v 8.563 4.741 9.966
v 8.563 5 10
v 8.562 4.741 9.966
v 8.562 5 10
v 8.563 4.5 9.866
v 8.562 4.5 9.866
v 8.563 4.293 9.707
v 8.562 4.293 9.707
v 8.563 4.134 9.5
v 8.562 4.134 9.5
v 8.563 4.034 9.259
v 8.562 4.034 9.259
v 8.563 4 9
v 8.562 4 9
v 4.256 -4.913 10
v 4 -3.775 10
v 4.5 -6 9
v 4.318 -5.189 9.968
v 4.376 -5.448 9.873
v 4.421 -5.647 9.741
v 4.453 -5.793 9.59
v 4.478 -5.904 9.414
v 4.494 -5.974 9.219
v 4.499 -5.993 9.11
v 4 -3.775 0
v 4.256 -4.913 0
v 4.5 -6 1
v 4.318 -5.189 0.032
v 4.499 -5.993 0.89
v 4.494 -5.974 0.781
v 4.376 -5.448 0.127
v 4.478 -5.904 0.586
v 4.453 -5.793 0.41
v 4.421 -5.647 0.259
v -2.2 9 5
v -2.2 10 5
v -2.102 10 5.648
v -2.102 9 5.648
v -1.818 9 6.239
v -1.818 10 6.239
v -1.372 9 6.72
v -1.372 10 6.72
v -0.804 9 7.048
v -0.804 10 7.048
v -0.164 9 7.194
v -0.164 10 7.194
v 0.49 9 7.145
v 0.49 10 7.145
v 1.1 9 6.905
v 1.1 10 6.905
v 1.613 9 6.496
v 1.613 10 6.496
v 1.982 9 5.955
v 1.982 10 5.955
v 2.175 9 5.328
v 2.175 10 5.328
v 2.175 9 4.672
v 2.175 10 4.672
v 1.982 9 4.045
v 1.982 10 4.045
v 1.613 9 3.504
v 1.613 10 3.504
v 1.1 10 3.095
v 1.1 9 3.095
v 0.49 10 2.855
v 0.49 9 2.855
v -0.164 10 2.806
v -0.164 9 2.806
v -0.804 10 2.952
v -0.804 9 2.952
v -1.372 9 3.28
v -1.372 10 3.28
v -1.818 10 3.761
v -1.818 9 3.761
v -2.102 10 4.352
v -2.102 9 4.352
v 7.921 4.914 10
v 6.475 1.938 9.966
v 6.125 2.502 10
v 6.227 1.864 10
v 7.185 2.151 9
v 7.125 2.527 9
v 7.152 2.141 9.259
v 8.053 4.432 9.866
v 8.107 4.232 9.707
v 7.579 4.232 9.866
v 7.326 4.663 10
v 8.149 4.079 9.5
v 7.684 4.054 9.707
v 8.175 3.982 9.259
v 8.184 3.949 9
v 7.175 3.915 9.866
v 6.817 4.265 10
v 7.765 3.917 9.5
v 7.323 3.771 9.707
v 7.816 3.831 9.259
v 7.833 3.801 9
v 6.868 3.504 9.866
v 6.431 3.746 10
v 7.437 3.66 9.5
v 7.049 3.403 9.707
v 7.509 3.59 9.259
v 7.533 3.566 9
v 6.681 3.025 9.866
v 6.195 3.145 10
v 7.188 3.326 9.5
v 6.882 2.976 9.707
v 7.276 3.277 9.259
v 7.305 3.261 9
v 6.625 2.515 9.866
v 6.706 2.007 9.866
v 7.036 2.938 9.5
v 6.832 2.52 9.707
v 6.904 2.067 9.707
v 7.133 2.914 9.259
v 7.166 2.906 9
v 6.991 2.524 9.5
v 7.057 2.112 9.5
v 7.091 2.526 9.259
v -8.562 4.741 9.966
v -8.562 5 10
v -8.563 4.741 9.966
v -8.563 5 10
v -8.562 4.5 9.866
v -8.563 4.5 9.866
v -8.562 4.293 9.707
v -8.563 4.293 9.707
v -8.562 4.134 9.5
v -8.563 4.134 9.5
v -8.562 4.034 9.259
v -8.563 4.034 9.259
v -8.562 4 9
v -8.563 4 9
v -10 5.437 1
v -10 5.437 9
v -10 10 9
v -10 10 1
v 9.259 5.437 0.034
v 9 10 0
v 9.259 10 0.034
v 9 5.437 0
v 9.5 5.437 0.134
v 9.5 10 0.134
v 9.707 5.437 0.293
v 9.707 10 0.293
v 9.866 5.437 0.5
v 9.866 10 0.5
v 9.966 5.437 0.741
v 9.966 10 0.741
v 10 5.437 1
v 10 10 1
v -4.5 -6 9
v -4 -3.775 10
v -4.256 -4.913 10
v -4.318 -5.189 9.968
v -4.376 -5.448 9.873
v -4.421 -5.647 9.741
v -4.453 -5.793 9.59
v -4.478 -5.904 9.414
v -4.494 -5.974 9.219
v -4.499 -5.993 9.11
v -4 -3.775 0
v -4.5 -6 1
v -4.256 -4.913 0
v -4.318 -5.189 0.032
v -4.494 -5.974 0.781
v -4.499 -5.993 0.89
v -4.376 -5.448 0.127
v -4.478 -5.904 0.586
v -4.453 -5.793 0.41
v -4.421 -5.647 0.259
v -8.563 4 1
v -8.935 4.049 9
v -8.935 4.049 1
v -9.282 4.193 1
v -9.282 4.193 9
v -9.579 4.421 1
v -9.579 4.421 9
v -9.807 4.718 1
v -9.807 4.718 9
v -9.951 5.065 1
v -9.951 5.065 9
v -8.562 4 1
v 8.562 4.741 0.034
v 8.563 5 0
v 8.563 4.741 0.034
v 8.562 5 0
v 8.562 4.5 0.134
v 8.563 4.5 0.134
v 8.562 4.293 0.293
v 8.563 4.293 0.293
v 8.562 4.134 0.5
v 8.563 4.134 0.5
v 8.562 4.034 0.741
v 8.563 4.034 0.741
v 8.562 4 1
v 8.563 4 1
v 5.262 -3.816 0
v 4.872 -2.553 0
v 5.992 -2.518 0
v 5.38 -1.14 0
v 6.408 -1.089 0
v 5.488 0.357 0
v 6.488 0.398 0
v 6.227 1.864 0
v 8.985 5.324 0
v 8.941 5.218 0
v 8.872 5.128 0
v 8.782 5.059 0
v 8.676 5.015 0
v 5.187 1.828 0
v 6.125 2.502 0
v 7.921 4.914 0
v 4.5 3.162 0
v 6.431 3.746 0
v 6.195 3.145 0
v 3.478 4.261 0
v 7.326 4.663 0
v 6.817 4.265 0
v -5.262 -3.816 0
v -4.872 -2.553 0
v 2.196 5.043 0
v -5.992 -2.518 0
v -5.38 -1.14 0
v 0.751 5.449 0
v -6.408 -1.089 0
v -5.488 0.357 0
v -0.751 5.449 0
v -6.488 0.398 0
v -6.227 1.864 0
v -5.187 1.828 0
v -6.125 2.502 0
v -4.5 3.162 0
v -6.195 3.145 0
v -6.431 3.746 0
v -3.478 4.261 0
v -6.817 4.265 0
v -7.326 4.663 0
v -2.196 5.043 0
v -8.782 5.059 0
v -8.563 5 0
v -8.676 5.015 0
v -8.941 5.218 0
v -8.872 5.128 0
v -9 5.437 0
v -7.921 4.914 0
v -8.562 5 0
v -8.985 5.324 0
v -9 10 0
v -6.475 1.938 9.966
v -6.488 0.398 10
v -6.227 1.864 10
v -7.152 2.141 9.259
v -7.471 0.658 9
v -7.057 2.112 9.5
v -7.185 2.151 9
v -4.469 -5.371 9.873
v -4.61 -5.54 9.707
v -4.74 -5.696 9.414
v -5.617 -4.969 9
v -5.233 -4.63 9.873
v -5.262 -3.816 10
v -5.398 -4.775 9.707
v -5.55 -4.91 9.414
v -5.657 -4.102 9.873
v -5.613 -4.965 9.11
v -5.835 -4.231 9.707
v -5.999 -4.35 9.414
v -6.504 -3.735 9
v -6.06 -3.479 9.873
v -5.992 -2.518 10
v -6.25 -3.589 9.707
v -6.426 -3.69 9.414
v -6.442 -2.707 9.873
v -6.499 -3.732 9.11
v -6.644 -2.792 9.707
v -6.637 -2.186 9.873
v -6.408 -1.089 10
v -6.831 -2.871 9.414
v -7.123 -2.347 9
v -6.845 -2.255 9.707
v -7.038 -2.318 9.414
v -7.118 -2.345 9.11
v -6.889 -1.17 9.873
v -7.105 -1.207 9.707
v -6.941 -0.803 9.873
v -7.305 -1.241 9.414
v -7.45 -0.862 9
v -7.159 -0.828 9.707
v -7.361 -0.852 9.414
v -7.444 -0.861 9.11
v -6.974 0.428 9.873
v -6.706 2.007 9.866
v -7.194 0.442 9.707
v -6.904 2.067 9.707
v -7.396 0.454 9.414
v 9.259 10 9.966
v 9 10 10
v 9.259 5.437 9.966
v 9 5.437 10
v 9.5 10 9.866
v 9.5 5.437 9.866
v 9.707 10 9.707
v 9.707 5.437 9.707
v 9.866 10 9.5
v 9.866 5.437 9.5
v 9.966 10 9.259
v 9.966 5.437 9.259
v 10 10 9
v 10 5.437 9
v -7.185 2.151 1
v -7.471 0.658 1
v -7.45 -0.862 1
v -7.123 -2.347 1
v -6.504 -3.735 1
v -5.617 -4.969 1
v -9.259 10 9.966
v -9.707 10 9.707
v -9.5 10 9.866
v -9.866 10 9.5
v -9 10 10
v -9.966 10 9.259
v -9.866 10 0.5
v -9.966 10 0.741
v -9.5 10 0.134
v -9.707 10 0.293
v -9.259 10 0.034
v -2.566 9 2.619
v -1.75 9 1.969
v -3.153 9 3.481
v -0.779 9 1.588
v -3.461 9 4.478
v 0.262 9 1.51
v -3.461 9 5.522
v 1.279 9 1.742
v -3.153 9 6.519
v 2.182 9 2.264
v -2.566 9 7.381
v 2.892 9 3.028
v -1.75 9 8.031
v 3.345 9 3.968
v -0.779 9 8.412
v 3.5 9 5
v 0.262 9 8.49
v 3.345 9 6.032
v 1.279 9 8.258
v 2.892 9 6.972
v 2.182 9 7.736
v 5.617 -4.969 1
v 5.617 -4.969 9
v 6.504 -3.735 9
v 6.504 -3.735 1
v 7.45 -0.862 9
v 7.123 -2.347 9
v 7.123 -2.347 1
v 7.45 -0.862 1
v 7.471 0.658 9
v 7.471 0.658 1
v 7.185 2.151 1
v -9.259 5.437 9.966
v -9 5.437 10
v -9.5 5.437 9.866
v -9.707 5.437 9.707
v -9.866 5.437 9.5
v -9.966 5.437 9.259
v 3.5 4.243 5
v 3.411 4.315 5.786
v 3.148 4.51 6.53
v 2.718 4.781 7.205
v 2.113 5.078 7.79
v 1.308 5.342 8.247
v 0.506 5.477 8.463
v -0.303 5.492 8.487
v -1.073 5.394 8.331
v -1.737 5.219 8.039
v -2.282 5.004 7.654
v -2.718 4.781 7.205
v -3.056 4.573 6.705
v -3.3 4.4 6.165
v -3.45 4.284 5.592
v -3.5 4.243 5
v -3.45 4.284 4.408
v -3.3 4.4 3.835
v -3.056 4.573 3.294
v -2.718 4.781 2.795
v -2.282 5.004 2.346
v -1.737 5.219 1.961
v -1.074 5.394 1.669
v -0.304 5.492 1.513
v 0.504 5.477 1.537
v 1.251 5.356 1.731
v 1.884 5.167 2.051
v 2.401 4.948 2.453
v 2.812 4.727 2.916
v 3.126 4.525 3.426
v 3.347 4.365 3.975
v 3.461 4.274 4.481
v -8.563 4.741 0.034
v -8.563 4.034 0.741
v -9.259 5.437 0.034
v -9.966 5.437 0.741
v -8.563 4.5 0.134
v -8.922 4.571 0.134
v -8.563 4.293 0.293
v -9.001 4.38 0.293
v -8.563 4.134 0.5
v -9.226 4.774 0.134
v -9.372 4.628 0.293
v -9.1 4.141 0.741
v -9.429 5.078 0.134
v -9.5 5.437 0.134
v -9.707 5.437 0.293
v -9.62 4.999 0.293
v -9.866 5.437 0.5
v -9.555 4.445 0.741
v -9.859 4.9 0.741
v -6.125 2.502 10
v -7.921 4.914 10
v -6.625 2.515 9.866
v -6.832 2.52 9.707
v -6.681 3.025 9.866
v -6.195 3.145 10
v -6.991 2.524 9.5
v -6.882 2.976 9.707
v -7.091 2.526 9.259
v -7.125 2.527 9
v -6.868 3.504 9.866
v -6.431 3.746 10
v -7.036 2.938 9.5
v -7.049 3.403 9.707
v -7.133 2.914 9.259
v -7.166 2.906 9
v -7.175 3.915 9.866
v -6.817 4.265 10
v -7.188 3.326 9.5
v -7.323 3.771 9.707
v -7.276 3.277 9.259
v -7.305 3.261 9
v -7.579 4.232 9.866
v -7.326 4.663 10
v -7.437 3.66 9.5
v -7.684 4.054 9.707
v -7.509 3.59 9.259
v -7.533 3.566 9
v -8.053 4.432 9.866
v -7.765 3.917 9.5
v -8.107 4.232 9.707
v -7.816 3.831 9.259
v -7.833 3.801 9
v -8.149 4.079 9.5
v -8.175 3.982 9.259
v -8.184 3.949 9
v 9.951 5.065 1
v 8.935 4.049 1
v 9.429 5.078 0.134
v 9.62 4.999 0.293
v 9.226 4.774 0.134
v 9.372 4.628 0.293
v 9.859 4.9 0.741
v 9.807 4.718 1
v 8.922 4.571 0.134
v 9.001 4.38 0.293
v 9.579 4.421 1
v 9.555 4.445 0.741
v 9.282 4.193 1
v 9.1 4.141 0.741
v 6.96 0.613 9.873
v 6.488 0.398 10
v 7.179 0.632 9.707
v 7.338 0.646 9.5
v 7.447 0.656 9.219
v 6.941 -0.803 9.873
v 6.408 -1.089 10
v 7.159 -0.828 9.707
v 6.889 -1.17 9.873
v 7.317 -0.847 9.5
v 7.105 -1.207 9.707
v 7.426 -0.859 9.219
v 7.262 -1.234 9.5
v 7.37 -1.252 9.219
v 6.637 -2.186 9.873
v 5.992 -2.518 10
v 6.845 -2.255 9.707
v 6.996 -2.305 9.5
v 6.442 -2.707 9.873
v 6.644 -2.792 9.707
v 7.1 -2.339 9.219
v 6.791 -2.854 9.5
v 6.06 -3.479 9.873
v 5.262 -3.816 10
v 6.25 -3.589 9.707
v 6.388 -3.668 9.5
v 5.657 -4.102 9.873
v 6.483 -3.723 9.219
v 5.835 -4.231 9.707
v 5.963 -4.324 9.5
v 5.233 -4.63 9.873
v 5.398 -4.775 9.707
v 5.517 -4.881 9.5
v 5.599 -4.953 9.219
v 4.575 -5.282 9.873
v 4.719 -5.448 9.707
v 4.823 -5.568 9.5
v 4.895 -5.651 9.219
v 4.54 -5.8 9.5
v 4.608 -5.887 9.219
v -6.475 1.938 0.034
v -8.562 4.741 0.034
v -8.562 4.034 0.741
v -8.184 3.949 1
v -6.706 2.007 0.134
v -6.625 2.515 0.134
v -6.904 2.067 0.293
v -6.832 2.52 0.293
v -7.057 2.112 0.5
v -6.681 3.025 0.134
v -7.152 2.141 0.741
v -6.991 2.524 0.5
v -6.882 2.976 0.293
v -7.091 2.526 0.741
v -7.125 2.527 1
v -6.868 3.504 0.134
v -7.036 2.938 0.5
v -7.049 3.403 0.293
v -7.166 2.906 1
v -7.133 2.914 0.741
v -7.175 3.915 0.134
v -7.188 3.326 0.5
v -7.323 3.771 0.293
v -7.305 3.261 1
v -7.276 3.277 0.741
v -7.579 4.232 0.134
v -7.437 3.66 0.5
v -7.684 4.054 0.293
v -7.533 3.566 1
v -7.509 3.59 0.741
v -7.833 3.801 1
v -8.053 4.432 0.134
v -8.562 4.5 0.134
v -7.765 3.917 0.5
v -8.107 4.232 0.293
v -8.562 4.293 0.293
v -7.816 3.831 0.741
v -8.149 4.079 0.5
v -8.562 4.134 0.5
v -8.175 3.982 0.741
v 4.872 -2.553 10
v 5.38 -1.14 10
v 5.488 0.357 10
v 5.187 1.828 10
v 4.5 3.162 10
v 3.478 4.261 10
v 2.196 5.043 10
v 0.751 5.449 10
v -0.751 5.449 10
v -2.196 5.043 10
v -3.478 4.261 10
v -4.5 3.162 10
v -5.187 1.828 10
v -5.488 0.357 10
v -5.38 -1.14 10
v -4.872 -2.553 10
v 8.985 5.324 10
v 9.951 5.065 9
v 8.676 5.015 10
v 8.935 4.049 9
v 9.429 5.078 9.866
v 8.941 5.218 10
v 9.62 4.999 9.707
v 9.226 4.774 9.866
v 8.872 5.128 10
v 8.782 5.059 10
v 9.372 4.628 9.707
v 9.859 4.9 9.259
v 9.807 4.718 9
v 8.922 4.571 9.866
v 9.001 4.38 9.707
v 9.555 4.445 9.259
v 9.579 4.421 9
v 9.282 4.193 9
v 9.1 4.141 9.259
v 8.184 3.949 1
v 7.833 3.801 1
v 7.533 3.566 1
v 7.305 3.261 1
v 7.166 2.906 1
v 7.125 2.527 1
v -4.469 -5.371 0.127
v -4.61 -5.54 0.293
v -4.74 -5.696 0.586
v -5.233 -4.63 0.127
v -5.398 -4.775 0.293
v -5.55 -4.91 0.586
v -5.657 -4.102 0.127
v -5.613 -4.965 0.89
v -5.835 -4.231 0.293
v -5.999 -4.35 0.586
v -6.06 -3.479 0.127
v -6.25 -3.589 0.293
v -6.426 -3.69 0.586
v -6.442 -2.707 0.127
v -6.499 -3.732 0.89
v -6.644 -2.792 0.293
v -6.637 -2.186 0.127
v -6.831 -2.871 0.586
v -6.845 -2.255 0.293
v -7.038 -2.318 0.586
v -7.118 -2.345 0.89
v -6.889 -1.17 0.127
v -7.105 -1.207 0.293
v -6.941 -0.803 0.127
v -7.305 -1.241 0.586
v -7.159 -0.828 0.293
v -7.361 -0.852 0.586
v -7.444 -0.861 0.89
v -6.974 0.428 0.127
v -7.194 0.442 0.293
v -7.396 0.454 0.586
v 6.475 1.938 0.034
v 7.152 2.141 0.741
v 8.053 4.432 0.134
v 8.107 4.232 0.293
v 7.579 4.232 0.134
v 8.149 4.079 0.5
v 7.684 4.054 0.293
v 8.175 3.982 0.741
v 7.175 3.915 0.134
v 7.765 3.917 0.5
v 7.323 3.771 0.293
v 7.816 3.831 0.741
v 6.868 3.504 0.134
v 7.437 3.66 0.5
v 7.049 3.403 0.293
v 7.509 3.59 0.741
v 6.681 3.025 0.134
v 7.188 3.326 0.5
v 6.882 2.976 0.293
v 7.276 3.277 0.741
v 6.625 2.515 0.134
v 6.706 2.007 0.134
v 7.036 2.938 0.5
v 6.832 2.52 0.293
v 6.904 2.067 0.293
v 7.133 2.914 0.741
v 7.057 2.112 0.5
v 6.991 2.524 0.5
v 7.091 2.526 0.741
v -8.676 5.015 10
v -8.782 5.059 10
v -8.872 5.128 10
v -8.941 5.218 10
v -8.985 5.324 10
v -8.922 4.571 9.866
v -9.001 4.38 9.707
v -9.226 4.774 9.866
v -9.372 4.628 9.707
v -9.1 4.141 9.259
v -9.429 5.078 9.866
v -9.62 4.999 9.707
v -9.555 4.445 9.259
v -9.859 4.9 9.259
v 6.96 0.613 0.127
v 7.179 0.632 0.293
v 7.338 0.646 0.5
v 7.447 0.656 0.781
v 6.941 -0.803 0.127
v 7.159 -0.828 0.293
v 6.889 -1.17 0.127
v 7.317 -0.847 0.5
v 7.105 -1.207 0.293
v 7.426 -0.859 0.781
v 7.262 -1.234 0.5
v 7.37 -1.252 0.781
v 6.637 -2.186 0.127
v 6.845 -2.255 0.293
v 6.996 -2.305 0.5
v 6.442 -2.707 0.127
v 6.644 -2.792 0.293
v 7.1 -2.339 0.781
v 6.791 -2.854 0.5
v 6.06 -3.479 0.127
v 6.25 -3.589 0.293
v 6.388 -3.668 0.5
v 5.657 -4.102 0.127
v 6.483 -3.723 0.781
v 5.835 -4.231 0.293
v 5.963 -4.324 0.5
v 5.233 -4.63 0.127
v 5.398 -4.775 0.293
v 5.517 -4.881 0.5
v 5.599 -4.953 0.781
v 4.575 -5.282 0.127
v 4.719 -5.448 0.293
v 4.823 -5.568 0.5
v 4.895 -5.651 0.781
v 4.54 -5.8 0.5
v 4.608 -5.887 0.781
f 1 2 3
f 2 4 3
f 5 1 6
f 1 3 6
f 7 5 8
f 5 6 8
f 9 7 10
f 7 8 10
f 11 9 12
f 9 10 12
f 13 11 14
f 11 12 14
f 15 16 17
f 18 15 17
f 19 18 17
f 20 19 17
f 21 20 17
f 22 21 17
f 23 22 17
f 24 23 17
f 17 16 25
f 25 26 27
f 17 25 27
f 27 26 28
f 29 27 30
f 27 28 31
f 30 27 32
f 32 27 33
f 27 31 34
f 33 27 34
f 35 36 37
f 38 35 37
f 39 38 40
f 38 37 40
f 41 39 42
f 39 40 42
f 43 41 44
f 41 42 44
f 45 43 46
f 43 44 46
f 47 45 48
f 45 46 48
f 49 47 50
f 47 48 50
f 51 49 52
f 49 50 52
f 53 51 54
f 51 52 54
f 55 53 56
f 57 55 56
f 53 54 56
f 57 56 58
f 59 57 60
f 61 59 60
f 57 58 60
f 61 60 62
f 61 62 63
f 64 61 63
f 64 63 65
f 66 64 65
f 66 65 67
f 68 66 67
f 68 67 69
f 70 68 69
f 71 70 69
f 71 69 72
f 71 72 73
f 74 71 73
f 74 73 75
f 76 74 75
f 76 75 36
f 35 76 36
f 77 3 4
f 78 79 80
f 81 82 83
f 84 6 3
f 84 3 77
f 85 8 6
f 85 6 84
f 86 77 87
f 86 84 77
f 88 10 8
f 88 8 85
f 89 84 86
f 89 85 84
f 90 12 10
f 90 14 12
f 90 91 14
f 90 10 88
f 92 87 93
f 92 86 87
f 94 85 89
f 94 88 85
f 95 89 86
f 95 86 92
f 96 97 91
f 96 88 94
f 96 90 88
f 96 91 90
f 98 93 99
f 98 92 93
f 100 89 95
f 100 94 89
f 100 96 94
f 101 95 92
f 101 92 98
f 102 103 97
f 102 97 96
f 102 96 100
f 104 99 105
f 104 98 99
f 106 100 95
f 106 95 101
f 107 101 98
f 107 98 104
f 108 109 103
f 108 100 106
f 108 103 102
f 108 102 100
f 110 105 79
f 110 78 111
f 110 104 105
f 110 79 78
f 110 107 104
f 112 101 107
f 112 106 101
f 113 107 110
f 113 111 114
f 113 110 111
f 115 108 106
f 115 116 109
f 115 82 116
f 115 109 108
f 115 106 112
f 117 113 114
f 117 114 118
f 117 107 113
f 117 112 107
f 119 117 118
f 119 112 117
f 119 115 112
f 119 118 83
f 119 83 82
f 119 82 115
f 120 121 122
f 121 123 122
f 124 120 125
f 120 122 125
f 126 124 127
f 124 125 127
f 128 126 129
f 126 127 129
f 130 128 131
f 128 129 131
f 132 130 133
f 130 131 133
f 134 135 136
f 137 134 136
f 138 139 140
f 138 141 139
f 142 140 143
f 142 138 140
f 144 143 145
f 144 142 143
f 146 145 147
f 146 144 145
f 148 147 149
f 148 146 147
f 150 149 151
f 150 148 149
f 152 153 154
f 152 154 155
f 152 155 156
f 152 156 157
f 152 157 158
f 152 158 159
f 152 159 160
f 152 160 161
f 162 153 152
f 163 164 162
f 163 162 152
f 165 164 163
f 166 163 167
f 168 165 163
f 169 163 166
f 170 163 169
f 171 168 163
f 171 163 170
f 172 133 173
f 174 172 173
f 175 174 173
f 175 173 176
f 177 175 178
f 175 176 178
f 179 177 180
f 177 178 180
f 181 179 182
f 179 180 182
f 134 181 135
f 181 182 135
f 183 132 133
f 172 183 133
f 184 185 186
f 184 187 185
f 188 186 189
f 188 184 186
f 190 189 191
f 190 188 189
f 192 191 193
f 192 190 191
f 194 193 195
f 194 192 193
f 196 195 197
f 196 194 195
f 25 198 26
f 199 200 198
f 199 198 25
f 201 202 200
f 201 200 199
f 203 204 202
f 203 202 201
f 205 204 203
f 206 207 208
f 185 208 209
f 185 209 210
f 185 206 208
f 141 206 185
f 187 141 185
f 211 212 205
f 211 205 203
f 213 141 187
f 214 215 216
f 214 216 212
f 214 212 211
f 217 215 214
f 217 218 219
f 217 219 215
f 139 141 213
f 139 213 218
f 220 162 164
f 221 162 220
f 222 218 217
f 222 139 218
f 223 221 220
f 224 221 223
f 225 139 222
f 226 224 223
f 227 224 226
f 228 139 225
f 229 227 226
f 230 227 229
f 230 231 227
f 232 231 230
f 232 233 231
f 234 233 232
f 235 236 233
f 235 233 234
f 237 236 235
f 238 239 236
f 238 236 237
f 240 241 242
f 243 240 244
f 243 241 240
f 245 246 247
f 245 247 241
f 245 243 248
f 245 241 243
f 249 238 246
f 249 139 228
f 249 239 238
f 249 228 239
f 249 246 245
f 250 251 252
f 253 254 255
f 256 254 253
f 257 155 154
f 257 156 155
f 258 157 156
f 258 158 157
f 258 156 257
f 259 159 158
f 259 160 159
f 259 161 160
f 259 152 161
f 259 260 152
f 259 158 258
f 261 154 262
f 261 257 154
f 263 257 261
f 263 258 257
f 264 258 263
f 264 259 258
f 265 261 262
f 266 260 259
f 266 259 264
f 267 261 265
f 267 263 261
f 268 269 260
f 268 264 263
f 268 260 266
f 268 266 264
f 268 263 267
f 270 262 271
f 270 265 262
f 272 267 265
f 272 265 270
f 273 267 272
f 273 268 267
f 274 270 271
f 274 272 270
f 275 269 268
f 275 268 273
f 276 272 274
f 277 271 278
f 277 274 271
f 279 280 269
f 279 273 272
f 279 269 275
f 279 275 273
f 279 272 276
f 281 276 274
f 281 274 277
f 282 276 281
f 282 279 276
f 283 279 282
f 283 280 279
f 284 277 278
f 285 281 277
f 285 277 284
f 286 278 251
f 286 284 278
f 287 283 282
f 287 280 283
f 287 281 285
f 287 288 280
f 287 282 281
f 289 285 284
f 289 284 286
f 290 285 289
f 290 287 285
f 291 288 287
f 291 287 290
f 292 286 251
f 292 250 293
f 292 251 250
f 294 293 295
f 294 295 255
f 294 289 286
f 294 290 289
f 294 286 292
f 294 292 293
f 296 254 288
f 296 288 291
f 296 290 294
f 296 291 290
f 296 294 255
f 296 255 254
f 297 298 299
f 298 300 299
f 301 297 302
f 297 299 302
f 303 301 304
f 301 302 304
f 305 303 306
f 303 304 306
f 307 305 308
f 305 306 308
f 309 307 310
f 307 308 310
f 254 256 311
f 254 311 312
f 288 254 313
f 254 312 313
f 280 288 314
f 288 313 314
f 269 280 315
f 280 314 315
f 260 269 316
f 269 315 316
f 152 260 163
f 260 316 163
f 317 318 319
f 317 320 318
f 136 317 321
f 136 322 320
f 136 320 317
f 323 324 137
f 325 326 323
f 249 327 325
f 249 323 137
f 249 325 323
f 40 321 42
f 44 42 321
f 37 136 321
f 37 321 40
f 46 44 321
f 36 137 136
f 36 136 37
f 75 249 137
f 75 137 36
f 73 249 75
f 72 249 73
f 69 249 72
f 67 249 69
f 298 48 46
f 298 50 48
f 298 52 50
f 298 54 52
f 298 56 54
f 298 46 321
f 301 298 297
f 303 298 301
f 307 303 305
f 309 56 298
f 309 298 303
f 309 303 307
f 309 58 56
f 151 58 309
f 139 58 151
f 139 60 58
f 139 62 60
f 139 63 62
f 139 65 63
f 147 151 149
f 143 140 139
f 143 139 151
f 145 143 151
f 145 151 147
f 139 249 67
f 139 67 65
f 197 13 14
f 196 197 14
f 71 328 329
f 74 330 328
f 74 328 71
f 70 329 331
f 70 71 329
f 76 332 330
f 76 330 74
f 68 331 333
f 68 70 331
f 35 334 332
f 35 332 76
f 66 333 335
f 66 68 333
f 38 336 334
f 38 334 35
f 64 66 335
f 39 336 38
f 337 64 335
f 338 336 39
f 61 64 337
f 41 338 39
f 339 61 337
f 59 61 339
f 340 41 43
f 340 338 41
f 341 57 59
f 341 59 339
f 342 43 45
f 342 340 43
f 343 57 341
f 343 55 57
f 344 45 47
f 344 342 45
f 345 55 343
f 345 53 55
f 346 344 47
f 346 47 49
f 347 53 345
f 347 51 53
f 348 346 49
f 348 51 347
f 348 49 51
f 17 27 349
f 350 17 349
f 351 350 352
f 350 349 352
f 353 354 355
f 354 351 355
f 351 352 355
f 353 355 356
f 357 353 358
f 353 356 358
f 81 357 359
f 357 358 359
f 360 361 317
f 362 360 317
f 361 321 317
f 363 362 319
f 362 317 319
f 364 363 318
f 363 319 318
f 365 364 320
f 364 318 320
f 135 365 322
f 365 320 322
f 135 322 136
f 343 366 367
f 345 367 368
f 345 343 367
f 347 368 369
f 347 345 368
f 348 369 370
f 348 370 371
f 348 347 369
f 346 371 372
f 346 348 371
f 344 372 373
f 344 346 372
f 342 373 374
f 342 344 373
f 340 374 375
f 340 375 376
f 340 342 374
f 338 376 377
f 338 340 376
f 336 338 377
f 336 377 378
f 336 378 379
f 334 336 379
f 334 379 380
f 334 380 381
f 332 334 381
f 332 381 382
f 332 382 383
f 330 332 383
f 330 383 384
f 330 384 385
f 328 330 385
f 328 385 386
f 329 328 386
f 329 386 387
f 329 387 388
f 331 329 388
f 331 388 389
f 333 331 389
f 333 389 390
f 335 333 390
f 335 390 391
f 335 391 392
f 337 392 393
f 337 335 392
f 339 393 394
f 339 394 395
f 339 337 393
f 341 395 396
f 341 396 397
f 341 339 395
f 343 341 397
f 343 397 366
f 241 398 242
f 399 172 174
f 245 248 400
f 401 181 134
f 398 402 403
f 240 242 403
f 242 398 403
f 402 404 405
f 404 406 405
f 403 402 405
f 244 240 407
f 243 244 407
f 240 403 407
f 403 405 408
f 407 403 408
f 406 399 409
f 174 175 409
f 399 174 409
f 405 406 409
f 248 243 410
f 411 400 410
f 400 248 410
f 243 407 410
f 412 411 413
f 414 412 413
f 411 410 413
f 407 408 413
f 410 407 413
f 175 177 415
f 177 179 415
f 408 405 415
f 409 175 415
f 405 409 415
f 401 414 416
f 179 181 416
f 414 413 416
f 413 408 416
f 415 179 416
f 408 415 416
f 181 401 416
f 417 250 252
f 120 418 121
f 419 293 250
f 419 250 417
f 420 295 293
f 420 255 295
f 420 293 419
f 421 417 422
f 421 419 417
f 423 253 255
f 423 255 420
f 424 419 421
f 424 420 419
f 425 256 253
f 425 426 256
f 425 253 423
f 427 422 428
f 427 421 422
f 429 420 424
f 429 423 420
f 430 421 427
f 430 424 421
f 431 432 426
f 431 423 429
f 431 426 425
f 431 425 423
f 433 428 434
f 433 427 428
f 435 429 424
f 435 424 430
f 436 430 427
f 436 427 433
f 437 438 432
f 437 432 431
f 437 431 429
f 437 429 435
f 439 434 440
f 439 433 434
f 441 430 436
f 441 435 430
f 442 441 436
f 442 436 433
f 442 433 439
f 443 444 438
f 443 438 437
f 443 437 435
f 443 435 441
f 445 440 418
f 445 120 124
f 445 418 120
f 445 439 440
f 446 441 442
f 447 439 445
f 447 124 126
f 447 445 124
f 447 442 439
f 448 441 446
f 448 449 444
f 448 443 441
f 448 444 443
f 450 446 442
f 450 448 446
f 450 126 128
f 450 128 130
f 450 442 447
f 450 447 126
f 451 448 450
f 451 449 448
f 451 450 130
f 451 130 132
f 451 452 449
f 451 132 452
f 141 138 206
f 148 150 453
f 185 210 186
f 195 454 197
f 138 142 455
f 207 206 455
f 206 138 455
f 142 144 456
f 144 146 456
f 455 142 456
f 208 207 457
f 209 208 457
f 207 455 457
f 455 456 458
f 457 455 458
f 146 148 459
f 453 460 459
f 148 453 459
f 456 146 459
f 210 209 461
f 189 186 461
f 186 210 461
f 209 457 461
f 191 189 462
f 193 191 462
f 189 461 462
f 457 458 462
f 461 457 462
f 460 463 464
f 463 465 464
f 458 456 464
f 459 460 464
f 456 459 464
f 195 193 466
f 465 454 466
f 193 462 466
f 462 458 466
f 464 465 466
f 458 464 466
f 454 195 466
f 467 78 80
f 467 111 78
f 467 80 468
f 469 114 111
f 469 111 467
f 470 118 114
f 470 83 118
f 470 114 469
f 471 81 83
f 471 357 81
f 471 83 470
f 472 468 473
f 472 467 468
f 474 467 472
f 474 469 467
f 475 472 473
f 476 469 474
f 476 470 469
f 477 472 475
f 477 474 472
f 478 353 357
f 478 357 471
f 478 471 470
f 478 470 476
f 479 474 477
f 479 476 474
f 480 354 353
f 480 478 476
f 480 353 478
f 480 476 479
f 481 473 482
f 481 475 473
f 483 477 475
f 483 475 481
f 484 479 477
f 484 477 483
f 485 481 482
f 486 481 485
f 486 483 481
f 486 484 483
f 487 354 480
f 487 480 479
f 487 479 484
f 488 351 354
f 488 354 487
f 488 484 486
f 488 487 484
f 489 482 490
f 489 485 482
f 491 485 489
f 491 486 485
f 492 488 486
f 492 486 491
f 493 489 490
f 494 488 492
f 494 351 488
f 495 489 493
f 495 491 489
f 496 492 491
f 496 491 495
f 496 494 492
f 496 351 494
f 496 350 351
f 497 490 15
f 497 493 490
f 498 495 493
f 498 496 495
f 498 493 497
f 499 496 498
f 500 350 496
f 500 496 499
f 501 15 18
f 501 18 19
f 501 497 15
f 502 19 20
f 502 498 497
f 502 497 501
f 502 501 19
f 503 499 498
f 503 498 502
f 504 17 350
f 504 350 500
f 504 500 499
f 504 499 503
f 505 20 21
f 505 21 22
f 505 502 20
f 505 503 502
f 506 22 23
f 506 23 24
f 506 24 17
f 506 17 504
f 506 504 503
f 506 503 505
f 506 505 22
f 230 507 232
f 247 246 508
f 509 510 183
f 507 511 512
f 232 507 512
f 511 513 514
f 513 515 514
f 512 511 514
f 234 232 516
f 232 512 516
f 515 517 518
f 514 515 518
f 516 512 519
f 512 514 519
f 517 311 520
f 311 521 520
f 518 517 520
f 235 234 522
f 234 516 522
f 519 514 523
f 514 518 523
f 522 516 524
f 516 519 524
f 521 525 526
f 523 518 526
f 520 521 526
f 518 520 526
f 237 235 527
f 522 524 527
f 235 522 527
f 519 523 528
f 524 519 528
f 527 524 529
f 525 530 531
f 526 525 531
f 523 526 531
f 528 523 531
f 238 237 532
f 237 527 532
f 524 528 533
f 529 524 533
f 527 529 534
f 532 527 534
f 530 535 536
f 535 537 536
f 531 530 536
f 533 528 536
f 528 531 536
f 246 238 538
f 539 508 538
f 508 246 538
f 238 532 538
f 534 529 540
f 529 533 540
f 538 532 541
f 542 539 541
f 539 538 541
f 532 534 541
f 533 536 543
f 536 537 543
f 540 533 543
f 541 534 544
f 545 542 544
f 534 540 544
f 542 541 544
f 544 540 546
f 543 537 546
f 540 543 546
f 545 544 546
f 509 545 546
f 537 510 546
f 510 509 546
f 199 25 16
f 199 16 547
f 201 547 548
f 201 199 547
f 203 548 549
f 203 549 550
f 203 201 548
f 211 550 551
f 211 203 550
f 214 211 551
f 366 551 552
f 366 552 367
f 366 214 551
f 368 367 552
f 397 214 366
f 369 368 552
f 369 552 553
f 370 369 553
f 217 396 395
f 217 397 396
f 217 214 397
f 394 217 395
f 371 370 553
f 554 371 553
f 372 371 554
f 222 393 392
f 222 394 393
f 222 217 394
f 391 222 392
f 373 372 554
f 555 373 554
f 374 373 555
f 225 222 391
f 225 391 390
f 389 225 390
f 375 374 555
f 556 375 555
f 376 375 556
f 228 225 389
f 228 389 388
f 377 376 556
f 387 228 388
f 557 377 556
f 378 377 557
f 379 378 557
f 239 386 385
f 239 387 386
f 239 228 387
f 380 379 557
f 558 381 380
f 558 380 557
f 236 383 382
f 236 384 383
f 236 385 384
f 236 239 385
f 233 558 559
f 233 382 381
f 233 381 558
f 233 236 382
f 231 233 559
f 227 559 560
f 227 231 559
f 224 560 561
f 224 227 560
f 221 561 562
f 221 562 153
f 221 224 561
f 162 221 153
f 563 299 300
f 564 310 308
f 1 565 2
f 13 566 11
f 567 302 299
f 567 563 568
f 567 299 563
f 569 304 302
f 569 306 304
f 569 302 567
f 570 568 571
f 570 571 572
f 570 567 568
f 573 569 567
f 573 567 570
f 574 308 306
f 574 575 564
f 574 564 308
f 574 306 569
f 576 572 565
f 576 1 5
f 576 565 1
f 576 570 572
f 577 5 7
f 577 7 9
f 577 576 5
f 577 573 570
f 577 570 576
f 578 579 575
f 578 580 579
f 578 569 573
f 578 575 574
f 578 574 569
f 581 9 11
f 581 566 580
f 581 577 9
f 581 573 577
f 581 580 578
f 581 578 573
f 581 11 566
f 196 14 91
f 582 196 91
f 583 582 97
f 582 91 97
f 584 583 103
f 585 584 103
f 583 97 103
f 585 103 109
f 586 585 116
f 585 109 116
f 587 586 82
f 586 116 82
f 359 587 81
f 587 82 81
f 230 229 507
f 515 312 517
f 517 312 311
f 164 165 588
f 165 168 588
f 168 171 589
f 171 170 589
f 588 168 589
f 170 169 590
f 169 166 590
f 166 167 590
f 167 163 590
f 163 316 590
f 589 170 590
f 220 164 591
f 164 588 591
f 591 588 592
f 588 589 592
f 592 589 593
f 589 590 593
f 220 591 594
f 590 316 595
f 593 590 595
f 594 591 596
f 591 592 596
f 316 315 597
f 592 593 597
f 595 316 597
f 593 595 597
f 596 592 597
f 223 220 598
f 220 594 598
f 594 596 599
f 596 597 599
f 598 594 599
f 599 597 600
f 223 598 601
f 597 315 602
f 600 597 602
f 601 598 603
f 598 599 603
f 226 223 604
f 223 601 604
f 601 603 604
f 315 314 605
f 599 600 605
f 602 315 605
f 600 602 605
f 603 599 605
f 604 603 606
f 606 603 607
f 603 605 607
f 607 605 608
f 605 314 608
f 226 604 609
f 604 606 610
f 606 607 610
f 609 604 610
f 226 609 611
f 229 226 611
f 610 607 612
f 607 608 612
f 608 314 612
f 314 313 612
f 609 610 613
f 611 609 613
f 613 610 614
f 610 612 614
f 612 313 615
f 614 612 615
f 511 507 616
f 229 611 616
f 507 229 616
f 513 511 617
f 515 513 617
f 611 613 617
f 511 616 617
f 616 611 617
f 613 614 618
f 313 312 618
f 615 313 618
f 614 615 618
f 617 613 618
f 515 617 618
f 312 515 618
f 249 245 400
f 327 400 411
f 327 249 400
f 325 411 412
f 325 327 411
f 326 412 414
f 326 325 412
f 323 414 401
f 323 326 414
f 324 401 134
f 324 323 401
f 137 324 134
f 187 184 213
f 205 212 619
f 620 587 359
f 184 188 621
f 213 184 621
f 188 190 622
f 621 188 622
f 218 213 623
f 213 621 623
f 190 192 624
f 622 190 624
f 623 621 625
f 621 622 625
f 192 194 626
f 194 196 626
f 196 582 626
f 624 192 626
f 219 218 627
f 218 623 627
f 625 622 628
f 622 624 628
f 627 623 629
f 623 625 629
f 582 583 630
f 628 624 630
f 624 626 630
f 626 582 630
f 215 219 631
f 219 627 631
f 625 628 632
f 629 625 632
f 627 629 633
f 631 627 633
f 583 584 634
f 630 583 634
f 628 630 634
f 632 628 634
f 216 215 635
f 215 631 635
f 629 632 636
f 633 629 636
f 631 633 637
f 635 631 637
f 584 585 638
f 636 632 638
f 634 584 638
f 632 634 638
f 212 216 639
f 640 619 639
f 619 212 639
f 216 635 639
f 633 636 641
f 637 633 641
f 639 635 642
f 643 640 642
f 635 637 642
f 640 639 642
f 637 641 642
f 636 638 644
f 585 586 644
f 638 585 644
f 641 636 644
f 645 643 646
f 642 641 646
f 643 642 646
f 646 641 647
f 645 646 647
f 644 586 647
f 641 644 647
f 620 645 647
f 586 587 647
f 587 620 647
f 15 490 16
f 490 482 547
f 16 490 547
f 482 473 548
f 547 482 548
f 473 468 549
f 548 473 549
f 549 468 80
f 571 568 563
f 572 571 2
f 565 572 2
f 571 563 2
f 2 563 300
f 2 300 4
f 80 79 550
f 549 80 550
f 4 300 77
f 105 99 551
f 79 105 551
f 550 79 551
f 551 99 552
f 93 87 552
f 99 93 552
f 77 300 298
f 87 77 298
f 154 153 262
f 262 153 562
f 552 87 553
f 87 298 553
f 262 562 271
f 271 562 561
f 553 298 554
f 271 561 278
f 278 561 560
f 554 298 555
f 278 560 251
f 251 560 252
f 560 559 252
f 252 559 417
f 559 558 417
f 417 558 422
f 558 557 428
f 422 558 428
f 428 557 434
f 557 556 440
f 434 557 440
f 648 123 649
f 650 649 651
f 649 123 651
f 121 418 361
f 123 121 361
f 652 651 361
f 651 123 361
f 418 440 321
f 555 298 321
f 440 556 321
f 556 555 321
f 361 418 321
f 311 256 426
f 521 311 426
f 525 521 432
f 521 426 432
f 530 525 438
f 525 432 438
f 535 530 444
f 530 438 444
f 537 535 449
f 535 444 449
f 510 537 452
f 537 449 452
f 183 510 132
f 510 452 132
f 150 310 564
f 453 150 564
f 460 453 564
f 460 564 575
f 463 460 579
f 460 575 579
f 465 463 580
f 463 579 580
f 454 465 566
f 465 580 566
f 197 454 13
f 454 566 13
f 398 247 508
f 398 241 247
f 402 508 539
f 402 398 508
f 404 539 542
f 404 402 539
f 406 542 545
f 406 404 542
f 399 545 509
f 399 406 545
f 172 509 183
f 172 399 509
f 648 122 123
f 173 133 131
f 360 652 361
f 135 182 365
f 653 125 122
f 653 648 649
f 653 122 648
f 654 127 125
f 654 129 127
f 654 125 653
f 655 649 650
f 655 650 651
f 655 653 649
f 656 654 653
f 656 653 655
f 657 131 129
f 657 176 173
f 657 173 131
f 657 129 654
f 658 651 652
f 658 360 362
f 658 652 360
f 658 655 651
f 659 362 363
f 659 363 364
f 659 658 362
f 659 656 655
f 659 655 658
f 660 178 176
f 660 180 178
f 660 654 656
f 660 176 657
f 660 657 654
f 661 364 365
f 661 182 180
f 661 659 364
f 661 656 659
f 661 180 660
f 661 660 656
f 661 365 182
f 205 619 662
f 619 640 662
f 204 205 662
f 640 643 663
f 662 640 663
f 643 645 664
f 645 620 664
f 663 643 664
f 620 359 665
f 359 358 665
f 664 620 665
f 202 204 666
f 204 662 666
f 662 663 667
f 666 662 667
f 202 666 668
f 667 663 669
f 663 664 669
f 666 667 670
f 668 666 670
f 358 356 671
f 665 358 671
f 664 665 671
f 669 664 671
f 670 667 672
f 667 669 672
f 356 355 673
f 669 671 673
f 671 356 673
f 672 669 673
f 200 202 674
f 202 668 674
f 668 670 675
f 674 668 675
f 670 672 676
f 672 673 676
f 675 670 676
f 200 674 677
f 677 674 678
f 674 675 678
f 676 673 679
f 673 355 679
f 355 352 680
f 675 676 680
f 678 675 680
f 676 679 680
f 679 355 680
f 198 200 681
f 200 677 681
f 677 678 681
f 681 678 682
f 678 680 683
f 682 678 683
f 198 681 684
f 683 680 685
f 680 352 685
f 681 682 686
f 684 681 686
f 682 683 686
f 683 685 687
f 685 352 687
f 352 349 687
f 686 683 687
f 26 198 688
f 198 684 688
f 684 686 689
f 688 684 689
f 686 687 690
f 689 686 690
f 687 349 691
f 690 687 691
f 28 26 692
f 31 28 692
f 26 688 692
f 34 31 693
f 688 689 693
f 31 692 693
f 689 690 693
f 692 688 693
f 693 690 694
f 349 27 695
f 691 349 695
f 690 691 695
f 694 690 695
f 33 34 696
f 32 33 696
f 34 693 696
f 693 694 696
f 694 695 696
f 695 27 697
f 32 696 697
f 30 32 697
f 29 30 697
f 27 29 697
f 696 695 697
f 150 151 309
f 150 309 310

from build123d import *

# Parameters (mm, degrees)
CYLINDER_R          = 3.5
CYLINDER_DEPTH      = 5
CYLINDER_ROLL_ANGLE = 90
PAD_DEPTH           = 10
FILLET_R            = 1.437
SKETCH001_R         = 2.2
POCKET_DEPTH        = 5
FILLET001_R         = 1


with BuildPart() as cylinder:
    # Cylinder → Cylinder (new body)
    with BuildSketch(Plane.XY):
        Circle(CYLINDER_R)
    extrude(amount=CYLINDER_DEPTH)


with BuildPart() as cylinder_1:
    # Cylinder roll: moved
    add(cylinder.part.rotate(Axis((0, 0, 0), (1, 0, 0)), CYLINDER_ROLL_ANGLE))


with BuildPart() as cylinder_2:
    # Cylinder placement: moved
    add(cylinder_1.part.moved(Location((0, 9, 5))))


with BuildPart() as fillet001:
    # Sketch → Pad (new body)
    with BuildSketch(Plane.XY):
        with BuildLine():
            ThreePointArc((4, -3.774917), (0, 5.5), (-4, -3.774917))
            Line((-4, -3.774917), (-4.5, -6))
            ThreePointArc((-6.344289, 4), (-7.375612, -1.360276), (-4.5, -6))
            Line((-6.344289, 4), (-10, 4))
            Line((-10, 4), (-10, 10))
            Line((-10, 10), (10, 10))
            Line((10, 10), (10, 4))
            Line((10, 4), (6.344289, 4))
            ThreePointArc((4.5, -6), (7.375612, -1.360276), (6.344289, 4))
            Line((4, -3.774917), (4.5, -6))
        make_face()
    extrude(amount=PAD_DEPTH)

    # Fillet
    fillet_edges = [fillet001.edges().sort_by_distance(p)[0] for p in [
        (-6.344289, 4, 5),
        (-10, 4, 5),
        (10, 4, 5),
        (6.344289, 4, 5),
    ]]
    fillet(fillet_edges, radius=FILLET_R)

    # Sketch001 → Pocket (cut)
    with BuildSketch(Plane(origin=(0, 10, 0), x_dir=(-1, 0, 0), z_dir=(0, 1, 0))):
        with Locations((0, 5)):
            Circle(SKETCH001_R)
    extrude(amount=-POCKET_DEPTH, mode=Mode.SUBTRACT)

    # Cut: cut Cylinder
    add(cylinder_2.part, mode=Mode.SUBTRACT)

    # Fillet001
    fillet001_edges = [fillet001.edges().sort_by_distance(p)[0] for p in [
        (10, 7.7185, 10),
        (10, 7.7185, 0),
        (-10, 7.7185, 0),
        (-10, 7.7185, 10),
    ]]
    fillet(fillet001_edges, radius=FILLET001_R)


solid = fillet001.part
